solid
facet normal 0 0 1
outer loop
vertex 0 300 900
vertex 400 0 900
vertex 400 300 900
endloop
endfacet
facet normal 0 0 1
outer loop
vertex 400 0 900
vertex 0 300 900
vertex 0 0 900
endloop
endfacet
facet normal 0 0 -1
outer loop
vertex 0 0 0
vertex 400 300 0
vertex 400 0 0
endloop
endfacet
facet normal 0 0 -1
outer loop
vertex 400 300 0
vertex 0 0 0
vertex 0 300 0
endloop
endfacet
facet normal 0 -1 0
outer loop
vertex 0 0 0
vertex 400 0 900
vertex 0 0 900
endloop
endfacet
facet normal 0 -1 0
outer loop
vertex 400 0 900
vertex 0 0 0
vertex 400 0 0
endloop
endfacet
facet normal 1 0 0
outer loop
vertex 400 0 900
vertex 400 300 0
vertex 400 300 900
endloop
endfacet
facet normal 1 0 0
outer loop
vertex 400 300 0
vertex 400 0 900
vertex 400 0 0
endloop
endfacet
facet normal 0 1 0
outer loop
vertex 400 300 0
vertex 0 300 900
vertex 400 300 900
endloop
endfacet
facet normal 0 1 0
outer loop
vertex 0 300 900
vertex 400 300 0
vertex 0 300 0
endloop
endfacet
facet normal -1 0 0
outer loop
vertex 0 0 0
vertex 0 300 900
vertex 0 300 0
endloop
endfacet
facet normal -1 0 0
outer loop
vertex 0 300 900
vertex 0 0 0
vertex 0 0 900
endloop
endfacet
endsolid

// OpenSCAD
/* 尺寸核对夹具（脱敏）：参数值与 原始资料/drawing.dxf 上的标注一一对应。

   用途：`python scripts/dim_check.py assets/example_dims --strict`
   —— 图纸标注 ↔ 模型参数 的数值回归。真图纸带尺寸标注的很少能进 CI，
   所以这里用一份最小但结构合法的 DXF 把这条链路钉住。
   =================================================================== */
BASE_L = 400;                                       // 来源：图纸 400
BASE_W = 300;                                       // 来源：图纸 300
POST_D = is_undef(SET_POST_D) ? 80 : SET_POST_D;    // 来源：图纸 φ80
POST_H = 900;                                       // 来源：图纸 900
ARM_L  = 600;                                       // 来源：图纸 600

module device() {
    cube([BASE_L, BASE_W, POST_H]);
}

device();
